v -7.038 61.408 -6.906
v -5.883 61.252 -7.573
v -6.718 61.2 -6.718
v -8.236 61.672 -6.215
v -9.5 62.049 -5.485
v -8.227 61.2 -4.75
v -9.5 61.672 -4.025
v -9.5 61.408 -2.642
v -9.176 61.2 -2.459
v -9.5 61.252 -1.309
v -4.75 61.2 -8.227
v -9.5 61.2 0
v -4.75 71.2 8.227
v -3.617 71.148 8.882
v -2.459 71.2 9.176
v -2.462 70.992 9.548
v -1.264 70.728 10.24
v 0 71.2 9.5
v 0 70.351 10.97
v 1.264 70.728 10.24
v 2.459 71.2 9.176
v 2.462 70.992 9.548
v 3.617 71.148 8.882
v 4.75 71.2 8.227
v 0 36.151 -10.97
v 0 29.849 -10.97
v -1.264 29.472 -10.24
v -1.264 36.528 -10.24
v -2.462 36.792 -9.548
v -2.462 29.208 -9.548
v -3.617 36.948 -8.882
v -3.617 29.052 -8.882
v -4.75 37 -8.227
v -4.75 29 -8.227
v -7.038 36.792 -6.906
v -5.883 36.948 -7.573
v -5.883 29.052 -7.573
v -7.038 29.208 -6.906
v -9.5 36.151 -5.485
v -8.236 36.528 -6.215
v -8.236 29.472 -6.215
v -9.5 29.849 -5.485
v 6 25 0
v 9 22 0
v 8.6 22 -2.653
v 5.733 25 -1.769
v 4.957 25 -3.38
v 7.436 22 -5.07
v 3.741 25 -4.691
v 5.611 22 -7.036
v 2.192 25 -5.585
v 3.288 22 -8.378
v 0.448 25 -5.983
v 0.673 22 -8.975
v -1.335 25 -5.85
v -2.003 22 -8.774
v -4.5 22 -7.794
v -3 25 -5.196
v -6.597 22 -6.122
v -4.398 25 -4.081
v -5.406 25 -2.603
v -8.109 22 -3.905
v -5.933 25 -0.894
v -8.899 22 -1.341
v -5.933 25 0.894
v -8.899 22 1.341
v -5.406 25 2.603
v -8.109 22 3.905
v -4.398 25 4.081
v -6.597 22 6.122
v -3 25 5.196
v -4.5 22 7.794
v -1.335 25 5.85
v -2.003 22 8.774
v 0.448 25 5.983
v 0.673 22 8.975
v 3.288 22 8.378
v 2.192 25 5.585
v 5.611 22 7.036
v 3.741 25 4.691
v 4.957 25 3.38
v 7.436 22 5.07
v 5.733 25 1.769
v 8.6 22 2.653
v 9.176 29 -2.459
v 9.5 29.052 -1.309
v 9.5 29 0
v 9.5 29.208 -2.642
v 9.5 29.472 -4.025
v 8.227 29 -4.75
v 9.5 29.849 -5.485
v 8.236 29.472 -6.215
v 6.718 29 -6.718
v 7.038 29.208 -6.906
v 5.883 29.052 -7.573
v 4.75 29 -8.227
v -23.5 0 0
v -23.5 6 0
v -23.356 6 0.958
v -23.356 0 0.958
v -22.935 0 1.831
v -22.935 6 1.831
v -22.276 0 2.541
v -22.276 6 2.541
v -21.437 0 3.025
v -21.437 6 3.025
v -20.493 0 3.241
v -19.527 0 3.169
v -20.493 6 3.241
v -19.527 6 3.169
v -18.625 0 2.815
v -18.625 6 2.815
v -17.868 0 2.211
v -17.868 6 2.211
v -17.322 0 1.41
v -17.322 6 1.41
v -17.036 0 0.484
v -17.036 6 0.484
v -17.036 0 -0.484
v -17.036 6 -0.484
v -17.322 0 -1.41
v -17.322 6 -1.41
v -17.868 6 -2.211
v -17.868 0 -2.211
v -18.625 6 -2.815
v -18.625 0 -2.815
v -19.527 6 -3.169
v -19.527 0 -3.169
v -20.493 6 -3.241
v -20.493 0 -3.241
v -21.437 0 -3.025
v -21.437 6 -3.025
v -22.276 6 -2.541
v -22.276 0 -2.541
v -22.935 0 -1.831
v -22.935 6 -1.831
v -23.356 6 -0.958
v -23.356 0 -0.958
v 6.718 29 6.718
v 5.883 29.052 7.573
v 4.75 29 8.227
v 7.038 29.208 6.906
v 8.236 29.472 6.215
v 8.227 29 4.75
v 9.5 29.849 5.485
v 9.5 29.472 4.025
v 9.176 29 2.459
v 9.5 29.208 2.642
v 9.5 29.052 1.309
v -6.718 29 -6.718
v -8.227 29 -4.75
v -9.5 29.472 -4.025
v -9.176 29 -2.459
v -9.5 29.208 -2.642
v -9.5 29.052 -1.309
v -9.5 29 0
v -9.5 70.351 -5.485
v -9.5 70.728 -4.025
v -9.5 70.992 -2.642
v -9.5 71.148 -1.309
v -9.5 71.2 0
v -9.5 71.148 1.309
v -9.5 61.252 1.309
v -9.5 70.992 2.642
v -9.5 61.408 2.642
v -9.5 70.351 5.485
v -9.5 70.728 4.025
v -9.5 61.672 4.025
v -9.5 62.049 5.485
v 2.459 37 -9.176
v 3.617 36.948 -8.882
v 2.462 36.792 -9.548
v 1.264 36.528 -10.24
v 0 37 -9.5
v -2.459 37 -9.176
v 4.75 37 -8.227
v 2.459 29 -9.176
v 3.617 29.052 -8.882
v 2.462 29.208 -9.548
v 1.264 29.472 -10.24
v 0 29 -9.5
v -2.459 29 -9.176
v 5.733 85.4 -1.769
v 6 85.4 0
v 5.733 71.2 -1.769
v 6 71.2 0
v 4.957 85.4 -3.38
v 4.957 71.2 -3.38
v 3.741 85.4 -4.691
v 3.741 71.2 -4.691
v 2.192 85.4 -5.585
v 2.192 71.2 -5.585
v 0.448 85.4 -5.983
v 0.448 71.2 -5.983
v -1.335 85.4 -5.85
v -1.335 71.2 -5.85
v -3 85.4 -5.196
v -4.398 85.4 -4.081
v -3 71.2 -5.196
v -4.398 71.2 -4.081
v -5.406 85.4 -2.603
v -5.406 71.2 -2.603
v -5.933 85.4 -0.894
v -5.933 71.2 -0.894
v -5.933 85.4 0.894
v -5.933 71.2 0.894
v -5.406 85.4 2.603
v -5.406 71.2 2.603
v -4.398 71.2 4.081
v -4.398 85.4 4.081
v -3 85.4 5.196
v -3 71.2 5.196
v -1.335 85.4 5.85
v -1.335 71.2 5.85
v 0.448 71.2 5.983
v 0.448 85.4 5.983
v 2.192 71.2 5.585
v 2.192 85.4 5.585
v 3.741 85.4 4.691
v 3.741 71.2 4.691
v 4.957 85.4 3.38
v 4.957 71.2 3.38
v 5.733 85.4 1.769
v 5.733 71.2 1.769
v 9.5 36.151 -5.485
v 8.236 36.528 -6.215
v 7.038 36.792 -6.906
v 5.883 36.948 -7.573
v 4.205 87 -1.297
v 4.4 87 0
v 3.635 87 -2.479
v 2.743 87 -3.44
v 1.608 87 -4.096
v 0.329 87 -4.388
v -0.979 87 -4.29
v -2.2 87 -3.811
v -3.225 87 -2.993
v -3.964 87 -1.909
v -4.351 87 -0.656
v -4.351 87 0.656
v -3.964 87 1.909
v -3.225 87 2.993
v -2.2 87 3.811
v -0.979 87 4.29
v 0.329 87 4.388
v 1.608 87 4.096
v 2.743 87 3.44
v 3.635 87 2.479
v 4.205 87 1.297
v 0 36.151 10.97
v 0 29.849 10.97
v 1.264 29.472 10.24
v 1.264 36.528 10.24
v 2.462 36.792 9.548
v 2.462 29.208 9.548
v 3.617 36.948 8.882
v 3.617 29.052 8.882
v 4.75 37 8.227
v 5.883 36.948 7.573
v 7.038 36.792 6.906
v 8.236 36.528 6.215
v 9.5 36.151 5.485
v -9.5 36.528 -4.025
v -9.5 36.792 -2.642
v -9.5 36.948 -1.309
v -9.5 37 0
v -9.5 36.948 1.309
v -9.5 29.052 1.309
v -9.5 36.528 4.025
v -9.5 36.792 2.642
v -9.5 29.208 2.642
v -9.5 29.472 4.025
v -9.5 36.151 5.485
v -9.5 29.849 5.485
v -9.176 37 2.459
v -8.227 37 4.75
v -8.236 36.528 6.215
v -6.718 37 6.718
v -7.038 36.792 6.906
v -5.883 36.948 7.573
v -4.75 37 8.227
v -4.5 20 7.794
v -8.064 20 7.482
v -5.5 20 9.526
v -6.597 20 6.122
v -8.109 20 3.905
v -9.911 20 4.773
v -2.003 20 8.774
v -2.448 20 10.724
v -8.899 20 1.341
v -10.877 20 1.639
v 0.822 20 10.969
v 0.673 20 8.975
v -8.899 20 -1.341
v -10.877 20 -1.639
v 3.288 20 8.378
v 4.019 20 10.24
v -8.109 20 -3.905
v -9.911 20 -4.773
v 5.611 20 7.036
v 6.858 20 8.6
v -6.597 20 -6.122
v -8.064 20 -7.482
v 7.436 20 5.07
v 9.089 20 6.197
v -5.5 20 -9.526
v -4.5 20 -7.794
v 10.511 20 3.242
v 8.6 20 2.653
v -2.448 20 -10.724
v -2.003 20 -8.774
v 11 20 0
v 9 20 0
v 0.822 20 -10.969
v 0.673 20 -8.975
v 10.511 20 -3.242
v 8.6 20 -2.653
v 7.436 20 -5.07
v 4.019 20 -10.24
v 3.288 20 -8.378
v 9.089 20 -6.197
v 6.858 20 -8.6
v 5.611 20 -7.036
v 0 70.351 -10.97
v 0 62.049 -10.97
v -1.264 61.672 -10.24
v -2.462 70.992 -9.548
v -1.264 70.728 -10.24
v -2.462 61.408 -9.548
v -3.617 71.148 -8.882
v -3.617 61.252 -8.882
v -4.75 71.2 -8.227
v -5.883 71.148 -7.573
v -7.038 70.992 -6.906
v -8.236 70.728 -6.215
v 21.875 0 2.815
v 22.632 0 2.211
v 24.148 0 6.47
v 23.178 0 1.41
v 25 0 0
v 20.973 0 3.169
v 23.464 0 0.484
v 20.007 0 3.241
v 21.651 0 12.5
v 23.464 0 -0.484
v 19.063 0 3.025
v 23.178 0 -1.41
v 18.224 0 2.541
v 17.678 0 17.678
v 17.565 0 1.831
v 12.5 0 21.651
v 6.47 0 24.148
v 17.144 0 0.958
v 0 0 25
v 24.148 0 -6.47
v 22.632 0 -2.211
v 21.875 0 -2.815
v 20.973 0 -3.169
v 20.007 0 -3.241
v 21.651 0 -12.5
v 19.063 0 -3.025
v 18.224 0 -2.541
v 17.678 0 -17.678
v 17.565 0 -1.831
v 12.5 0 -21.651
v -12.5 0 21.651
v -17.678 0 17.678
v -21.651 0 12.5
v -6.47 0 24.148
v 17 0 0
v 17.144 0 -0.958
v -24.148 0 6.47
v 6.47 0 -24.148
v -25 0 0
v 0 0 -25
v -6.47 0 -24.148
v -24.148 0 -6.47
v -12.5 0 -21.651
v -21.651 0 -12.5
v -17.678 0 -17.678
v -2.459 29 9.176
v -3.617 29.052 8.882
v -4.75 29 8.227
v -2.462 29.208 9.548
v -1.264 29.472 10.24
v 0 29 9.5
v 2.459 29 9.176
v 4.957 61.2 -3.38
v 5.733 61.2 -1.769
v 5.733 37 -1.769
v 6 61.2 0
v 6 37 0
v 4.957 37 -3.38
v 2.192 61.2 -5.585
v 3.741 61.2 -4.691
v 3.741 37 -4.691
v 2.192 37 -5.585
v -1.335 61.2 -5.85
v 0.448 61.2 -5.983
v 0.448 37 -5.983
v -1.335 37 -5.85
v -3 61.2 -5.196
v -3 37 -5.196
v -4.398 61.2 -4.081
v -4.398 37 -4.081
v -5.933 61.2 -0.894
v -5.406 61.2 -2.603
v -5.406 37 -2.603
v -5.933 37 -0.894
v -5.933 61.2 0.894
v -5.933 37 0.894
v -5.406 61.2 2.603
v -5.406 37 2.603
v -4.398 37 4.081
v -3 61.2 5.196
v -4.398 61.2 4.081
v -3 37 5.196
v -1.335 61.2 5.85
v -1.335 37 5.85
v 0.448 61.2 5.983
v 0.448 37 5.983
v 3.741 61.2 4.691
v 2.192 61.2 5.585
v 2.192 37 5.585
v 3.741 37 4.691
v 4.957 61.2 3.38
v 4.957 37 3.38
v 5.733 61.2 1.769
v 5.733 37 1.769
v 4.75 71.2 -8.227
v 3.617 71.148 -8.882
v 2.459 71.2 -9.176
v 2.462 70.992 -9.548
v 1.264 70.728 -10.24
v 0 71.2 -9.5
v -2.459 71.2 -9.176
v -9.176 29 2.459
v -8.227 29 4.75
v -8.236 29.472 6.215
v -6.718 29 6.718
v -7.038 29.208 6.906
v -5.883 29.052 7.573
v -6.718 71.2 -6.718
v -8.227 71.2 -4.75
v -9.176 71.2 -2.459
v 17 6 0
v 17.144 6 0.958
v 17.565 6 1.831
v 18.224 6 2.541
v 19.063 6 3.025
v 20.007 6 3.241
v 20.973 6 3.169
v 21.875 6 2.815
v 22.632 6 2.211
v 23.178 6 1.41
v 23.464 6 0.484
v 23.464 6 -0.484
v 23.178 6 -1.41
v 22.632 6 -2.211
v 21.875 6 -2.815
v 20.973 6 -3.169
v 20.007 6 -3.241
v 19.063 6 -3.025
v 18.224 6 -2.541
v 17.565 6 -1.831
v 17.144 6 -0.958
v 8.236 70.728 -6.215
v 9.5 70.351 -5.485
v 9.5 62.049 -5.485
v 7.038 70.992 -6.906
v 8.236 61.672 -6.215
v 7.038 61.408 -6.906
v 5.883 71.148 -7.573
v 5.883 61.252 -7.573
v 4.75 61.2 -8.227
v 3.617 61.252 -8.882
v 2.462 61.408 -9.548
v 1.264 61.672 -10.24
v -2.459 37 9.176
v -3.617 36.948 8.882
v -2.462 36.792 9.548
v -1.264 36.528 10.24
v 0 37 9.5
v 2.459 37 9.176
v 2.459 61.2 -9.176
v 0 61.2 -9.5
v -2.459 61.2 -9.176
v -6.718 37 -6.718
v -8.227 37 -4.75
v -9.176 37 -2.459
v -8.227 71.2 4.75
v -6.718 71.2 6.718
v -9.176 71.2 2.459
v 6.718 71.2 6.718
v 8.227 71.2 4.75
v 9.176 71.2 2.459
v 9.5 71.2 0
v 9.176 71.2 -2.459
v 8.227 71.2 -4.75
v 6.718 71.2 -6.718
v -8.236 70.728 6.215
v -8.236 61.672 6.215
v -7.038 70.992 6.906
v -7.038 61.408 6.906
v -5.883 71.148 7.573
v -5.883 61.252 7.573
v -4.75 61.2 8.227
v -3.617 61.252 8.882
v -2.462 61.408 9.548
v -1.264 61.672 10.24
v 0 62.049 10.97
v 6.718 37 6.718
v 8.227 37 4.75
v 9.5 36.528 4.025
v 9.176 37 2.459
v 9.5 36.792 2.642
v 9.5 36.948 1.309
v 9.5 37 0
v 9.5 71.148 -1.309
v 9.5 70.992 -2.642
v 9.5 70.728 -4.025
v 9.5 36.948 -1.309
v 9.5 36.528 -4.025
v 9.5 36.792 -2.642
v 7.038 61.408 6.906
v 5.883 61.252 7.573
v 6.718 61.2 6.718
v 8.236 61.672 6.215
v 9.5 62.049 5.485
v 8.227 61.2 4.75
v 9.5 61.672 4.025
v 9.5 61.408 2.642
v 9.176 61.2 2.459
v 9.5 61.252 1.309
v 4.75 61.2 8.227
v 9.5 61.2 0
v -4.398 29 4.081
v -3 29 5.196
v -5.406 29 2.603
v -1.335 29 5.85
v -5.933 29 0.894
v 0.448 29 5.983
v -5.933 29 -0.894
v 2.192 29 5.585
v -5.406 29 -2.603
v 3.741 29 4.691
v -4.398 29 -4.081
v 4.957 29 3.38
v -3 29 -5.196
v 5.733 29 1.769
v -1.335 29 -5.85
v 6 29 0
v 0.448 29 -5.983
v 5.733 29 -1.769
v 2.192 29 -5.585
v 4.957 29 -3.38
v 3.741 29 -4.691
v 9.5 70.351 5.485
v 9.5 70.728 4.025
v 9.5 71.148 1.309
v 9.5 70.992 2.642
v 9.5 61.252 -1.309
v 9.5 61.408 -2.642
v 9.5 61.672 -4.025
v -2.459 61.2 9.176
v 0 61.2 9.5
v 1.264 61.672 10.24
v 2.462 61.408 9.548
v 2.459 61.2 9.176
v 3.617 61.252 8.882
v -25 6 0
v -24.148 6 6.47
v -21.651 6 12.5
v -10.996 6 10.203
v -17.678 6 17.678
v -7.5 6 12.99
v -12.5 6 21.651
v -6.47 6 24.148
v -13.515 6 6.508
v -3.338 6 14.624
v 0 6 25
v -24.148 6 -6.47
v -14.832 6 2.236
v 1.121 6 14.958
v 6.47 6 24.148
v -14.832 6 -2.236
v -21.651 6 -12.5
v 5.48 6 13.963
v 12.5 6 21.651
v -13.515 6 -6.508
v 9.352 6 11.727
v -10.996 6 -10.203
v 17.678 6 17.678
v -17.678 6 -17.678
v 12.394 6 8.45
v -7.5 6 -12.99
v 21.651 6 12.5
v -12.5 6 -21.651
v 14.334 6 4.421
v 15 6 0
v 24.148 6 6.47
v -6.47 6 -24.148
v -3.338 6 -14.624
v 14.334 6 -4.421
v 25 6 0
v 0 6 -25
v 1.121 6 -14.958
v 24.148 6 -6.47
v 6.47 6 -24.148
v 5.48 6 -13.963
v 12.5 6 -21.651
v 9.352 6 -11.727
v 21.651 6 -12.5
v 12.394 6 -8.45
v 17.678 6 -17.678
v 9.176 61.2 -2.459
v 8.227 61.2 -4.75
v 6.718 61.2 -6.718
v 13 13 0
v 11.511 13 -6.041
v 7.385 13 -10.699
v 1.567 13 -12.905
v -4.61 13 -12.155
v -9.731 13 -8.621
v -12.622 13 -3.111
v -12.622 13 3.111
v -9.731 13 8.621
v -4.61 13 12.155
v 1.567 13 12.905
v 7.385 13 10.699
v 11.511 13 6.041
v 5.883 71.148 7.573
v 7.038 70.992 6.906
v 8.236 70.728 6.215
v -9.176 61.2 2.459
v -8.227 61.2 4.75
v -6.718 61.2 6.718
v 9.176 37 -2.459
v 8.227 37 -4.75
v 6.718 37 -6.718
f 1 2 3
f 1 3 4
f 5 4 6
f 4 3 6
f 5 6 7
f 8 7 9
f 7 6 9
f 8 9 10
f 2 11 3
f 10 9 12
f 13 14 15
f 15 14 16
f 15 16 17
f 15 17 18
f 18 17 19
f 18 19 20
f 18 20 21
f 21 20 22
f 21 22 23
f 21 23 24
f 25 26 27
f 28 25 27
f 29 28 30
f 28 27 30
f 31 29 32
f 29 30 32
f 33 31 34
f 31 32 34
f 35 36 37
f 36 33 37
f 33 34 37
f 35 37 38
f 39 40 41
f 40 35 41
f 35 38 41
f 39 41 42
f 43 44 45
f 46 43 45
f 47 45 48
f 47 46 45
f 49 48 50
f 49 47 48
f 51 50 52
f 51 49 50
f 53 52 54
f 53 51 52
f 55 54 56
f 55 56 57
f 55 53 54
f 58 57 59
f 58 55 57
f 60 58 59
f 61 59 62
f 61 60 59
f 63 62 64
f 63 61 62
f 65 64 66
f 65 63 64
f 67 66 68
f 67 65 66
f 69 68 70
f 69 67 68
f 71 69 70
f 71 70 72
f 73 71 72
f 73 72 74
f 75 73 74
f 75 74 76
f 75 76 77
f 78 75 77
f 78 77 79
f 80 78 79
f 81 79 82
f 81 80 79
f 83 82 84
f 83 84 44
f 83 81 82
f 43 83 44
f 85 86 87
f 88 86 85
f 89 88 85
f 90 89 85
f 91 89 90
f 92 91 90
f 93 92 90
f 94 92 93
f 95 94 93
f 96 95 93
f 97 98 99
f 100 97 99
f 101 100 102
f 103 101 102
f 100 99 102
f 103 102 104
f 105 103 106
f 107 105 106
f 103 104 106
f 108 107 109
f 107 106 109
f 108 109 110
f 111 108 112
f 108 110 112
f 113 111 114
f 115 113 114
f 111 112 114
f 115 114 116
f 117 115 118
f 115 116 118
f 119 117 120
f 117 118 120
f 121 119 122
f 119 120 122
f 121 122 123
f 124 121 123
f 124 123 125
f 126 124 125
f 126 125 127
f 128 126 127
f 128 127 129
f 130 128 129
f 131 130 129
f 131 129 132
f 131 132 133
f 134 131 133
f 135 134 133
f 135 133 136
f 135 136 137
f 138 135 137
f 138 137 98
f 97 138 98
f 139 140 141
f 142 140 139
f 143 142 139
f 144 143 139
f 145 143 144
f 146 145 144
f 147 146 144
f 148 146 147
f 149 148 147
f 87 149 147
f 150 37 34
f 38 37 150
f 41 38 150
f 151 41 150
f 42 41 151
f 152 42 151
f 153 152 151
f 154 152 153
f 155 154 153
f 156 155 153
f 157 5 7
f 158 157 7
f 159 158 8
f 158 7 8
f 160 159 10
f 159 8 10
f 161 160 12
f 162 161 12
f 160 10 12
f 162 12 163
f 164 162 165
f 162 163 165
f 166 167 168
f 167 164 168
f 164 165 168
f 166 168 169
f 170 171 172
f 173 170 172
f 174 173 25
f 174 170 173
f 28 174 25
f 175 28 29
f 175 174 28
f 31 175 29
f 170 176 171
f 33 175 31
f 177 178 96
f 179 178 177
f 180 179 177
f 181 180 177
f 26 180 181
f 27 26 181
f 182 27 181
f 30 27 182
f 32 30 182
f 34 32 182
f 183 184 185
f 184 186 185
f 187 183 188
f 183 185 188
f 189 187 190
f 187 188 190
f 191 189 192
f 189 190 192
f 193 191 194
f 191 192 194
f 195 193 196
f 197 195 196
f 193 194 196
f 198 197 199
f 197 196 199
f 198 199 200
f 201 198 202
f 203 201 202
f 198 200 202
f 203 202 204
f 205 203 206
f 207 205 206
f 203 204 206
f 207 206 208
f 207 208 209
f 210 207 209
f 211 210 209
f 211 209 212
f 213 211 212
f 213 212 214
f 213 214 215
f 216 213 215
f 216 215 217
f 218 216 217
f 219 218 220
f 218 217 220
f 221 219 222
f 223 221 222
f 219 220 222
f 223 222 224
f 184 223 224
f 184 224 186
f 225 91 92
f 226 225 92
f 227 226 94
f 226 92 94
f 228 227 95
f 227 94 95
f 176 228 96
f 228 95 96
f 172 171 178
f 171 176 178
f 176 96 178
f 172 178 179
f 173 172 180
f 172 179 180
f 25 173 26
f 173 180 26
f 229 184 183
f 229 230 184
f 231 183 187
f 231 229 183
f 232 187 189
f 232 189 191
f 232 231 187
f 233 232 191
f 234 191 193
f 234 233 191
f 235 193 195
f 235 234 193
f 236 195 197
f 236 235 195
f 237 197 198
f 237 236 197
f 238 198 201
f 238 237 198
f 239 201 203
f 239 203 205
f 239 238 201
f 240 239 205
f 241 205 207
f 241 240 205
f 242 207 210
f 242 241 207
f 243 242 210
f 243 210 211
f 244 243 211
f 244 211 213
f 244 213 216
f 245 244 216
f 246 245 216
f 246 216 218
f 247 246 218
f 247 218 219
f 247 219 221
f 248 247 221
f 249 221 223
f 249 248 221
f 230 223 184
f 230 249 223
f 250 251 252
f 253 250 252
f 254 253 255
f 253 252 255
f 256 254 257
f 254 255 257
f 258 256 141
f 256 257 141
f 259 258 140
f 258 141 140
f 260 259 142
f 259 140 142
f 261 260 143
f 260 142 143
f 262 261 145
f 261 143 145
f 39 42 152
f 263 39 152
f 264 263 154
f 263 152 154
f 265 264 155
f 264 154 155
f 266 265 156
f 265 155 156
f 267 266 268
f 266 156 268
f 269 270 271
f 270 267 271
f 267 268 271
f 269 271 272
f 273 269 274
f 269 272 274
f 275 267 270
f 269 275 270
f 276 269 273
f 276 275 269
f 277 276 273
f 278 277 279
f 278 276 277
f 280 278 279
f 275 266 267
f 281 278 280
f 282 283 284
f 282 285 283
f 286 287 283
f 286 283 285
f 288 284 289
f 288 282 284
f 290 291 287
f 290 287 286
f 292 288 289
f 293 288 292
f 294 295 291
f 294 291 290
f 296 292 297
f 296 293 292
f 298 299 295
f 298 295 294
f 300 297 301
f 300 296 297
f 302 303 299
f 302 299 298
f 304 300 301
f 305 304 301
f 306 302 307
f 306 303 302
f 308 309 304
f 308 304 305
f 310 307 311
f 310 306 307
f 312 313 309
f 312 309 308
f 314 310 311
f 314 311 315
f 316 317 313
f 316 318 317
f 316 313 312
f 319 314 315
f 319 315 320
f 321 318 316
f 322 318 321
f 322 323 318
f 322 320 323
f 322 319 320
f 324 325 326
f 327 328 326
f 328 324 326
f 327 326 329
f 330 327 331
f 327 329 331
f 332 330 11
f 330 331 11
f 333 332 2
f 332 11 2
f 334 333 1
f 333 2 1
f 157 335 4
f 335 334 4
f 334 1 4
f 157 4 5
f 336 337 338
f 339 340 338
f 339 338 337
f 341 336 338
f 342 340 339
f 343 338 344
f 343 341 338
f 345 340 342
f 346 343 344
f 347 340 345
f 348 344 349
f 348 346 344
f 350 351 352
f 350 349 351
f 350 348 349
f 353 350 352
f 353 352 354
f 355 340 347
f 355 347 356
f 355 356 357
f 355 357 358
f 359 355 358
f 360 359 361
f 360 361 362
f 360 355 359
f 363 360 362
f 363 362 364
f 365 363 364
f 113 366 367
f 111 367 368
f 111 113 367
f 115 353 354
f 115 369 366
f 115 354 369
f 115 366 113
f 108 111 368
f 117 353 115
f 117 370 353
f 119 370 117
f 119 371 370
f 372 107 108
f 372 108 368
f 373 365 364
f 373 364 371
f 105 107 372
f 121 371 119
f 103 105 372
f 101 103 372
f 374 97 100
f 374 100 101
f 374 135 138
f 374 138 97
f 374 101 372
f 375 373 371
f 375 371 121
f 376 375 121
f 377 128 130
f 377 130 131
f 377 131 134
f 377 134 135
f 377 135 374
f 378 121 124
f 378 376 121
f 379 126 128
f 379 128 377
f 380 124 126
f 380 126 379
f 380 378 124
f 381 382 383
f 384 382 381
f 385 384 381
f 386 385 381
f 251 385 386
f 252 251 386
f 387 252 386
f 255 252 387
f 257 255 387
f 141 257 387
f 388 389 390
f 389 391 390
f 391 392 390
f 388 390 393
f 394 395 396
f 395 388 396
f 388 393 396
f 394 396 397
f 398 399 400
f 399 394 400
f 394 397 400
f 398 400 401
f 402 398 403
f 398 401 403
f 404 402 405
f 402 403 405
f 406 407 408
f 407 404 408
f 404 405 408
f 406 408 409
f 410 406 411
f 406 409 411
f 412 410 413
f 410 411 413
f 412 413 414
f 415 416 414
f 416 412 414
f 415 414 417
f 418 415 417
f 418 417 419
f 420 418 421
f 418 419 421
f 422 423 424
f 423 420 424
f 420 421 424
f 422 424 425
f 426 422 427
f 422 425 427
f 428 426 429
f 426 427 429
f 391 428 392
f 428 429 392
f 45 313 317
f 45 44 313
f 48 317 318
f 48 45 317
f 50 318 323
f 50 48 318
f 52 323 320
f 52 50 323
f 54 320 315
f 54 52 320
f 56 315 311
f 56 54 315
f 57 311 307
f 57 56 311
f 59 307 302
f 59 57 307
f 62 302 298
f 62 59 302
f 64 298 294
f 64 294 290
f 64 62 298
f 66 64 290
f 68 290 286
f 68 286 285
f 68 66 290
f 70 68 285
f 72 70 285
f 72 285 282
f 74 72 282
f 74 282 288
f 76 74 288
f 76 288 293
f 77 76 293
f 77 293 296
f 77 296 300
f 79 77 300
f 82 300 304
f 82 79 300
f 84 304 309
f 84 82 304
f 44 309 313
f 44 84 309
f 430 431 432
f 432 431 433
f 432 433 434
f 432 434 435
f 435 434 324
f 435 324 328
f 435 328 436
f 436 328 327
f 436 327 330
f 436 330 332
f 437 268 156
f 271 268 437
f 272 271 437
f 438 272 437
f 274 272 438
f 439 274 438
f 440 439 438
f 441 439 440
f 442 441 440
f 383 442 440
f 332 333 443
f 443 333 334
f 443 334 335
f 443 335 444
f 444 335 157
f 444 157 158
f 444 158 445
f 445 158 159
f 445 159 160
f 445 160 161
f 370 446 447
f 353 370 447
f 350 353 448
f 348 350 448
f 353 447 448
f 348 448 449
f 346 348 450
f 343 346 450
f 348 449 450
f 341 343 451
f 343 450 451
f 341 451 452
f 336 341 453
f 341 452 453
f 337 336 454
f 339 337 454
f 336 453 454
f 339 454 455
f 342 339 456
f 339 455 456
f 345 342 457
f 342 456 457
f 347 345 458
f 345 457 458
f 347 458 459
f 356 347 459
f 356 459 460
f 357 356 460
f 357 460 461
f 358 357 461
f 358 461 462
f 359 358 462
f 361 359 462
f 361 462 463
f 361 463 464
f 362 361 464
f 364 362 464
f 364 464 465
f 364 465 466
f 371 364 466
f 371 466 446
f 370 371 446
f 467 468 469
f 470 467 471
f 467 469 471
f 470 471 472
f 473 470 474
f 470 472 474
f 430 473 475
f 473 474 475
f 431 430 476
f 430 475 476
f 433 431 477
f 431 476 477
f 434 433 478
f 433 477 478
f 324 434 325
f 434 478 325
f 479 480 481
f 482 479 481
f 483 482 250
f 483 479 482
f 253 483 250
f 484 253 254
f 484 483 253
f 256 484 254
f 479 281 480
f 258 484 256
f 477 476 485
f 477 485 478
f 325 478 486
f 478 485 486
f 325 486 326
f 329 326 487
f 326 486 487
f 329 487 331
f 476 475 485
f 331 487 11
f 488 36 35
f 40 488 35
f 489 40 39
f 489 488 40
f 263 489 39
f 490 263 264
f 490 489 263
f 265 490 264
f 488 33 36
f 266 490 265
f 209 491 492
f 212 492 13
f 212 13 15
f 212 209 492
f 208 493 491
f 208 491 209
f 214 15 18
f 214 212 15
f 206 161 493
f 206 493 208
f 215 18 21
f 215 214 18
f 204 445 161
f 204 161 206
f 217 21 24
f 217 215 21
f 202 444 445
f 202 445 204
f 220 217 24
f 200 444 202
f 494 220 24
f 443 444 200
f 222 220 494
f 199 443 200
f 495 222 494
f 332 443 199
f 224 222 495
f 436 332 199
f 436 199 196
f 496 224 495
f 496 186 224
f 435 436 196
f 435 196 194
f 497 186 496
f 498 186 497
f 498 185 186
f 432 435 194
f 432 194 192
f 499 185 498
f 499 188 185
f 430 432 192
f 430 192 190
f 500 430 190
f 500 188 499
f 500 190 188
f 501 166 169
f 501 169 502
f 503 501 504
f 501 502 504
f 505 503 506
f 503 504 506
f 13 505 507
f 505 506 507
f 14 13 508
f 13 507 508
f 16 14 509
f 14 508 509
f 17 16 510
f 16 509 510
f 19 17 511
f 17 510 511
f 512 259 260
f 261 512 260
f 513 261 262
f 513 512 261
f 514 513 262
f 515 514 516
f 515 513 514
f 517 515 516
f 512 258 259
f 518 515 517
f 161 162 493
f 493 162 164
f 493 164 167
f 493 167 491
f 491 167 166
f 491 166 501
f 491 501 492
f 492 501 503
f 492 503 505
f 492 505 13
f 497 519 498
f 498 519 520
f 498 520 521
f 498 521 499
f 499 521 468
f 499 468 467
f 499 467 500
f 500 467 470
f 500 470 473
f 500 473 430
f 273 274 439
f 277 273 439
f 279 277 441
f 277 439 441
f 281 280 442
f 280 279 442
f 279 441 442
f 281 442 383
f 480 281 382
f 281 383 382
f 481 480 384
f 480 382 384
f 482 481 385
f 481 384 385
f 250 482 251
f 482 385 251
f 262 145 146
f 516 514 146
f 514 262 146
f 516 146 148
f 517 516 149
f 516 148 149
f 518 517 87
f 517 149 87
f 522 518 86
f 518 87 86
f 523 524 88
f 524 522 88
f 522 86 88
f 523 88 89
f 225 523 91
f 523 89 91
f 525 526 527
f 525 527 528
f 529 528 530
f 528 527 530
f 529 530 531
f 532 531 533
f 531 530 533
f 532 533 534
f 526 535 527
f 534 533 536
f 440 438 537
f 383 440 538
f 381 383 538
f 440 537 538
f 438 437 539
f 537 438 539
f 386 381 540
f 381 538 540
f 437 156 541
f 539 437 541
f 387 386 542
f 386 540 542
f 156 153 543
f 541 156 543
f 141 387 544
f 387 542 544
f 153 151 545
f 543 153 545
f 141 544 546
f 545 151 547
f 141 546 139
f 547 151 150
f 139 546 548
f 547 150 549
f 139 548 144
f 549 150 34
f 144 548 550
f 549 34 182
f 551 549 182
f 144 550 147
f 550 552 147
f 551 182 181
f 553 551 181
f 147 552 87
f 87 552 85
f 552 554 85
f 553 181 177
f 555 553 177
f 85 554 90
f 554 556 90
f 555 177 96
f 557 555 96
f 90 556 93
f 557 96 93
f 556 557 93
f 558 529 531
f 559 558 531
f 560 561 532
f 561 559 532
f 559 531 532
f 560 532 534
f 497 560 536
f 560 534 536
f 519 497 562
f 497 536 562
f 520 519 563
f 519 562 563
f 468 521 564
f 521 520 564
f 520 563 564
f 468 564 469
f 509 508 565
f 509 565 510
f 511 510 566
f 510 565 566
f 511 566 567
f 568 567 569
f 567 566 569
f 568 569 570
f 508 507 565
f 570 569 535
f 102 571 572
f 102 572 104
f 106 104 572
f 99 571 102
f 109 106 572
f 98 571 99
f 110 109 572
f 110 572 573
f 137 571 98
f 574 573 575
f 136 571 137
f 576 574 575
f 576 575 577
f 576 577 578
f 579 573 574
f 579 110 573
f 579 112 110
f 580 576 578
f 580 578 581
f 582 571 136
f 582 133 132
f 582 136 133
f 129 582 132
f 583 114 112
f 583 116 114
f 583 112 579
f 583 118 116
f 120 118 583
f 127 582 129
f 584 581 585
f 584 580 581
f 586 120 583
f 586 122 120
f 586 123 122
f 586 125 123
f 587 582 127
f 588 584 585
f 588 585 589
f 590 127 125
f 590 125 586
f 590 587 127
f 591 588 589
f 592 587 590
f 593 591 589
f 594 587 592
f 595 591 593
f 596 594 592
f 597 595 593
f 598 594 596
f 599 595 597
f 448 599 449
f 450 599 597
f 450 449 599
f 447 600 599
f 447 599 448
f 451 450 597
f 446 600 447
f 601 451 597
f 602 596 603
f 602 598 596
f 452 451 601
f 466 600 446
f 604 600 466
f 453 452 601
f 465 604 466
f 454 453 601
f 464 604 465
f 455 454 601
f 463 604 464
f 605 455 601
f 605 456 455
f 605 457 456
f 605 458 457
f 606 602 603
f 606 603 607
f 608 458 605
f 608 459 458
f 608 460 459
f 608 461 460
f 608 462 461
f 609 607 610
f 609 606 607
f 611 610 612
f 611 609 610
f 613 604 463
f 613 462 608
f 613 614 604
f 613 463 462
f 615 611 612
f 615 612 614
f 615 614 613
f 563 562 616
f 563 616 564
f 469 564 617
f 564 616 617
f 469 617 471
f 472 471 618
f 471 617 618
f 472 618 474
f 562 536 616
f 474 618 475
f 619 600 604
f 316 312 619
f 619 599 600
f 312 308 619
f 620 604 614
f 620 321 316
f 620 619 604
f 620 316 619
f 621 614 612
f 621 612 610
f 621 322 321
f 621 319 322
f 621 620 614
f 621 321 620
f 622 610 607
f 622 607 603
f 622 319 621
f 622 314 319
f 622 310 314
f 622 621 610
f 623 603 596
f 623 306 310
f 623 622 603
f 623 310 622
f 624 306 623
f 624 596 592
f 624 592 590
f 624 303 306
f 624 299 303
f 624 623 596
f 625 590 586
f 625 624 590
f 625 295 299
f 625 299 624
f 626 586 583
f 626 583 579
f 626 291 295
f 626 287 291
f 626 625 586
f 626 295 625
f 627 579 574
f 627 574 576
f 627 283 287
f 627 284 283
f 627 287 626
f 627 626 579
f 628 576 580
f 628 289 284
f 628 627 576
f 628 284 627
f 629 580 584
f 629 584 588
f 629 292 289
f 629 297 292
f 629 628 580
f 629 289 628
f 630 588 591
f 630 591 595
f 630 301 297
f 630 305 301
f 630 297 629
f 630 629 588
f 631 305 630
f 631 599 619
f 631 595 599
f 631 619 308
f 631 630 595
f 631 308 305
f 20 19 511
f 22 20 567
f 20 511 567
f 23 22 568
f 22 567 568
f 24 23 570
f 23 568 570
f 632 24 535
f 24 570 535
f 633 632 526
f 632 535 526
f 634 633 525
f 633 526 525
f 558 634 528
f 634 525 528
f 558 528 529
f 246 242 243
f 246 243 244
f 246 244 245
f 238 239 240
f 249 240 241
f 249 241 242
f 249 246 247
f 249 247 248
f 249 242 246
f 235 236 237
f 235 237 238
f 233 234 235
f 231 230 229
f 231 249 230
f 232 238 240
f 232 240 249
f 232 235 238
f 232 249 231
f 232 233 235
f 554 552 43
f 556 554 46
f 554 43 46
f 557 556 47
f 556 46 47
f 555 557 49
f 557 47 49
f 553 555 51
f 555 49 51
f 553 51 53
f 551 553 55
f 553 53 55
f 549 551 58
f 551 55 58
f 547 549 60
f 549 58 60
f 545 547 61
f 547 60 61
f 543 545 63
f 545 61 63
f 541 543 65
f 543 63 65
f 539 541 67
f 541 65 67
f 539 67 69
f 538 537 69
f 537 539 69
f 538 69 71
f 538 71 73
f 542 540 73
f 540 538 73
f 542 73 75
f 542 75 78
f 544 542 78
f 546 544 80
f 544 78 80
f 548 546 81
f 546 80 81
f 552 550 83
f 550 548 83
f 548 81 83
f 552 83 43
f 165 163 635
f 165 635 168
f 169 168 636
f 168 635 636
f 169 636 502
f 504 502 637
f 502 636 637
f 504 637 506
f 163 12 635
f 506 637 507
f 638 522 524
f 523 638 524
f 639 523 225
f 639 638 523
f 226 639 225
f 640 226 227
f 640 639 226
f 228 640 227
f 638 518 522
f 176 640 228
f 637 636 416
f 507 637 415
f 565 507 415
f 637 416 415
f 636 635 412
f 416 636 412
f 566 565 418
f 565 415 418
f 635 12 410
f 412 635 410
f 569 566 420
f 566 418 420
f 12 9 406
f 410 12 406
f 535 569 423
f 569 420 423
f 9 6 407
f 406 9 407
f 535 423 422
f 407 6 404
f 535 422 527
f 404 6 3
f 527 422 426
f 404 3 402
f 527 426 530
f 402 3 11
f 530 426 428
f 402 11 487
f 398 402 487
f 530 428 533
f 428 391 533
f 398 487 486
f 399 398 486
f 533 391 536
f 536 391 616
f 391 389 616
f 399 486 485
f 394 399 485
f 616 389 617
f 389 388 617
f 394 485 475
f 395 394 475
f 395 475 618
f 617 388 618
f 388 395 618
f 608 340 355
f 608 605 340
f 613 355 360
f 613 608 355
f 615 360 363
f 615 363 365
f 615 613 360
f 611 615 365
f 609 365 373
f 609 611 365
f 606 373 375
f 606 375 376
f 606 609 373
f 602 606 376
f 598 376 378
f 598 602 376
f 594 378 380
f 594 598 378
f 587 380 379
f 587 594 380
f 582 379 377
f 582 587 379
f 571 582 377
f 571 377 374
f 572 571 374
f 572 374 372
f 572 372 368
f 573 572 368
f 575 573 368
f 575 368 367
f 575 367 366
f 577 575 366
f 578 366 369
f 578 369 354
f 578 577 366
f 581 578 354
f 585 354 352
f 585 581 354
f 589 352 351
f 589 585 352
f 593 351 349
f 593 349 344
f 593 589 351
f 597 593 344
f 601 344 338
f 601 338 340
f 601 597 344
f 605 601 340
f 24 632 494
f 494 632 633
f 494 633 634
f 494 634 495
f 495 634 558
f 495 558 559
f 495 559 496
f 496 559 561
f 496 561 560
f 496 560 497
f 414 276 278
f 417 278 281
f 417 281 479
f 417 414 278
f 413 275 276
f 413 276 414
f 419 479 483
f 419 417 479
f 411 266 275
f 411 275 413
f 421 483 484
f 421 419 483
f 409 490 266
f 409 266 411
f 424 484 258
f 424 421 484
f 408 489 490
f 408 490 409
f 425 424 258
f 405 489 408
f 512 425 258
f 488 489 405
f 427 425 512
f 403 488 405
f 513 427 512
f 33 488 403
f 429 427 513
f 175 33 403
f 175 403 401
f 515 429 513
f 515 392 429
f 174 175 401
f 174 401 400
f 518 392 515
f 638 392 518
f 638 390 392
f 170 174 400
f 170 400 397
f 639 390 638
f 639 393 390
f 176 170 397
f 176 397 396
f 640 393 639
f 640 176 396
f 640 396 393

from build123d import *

# Parameters (mm, degrees)
EXTRUDE_1_DEPTH     = 8
EXTRUDE_2_DEPTH     = 10
SKETCH_5_R          = 3.25
CUT_EXTRUDE_1_DEPTH = 7


with BuildPart() as part:
    # Эскиз1 → Повернуть1 (revolve)
    with BuildSketch(Plane.XY, mode=Mode.PRIVATE) as revolve_1_sk:
        Polygon((0, 0), (-25, 0), (-25, 6), (-15, 6), (-11, 20), (-9, 20), (-9, 22), (-6, 25), (-6, 29), (-6, 37), (-6, 85.4), (-4.4, 87), (0, 87), align=None)
    revolve(revolve_1_sk.sketch.rotate(Axis((0, 0, 0), (0, 1, 0)), 180), axis=Axis((0, 0, 0), (0, 1, 0)))  # turned: the seam where the file's is

    # Эскиз2 → Бобышка-Вытянуть1 (add)
    with BuildSketch(Plane(origin=(0, 29, 0), x_dir=(1, 0, 0), z_dir=(0, 1, 0))):
        Polygon((0, 10.969655115), (-9.5, 5.484827557), (-9.5, -5.484827557), (0, -10.969655115), (9.5, -5.484827557), (9.5, 5.484827557), align=None)
    extrude(amount=EXTRUDE_1_DEPTH)

    # Эскиз3 → Бобышка-Вытянуть2 (add)
    with BuildSketch(Plane(origin=(0, 61.2, 0), x_dir=(1, 0, 0), z_dir=(0, 1, 0))):
        Polygon((9.5, 5.484827557), (0, 10.969655115), (-9.5, 5.484827557), (-9.5, -5.484827557), (0, -10.969655115), (9.5, -5.484827557), align=None)
    extrude(amount=EXTRUDE_2_DEPTH)

    # Эскиз4 → Вырез-Повернуть2 (revolve, cut)
    with BuildSketch(Plane.XY, mode=Mode.PRIVATE) as cut_revolve_2_sk:
        Polygon((-18.160254038, 71.2), (-9.5, 71.2), (-18.160254038, 66.2), align=None)
        Polygon((-18.160254038, 61.2), (-18.160254038, 66.2), (-9.5, 61.2), align=None)
        Polygon((-16.42820323, 37), (-16.42820323, 33), (-9.5, 37), align=None)
        Polygon((-16.42820323, 33), (-16.42820323, 29), (-9.5, 29), align=None)
    revolve(cut_revolve_2_sk.sketch.rotate(Axis((0, 87, 0), (0, 1, 0)), 180), axis=Axis((0, 87, 0), (0, 1, 0)), mode=Mode.SUBTRACT)  # turned: the seam where the file's is

    # Эскиз5 → Вырез-Вытянуть1 (cut, through all)
    with BuildSketch(Plane(origin=(0, 6, 0), x_dir=(1, 0, 0), z_dir=(0, 1, 0))):
        with Locations(Location((-20.25, 0, 0), (0, 0, 180))):  # turned: the seam where the file's is
            Circle(SKETCH_5_R)
        with Locations(Location((20.25, 0, 0), (0, 0, 180))):  # turned: the seam where the file's is
            Circle(SKETCH_5_R)
    extrude(amount=-CUT_EXTRUDE_1_DEPTH, mode=Mode.SUBTRACT)


solid = part.part
